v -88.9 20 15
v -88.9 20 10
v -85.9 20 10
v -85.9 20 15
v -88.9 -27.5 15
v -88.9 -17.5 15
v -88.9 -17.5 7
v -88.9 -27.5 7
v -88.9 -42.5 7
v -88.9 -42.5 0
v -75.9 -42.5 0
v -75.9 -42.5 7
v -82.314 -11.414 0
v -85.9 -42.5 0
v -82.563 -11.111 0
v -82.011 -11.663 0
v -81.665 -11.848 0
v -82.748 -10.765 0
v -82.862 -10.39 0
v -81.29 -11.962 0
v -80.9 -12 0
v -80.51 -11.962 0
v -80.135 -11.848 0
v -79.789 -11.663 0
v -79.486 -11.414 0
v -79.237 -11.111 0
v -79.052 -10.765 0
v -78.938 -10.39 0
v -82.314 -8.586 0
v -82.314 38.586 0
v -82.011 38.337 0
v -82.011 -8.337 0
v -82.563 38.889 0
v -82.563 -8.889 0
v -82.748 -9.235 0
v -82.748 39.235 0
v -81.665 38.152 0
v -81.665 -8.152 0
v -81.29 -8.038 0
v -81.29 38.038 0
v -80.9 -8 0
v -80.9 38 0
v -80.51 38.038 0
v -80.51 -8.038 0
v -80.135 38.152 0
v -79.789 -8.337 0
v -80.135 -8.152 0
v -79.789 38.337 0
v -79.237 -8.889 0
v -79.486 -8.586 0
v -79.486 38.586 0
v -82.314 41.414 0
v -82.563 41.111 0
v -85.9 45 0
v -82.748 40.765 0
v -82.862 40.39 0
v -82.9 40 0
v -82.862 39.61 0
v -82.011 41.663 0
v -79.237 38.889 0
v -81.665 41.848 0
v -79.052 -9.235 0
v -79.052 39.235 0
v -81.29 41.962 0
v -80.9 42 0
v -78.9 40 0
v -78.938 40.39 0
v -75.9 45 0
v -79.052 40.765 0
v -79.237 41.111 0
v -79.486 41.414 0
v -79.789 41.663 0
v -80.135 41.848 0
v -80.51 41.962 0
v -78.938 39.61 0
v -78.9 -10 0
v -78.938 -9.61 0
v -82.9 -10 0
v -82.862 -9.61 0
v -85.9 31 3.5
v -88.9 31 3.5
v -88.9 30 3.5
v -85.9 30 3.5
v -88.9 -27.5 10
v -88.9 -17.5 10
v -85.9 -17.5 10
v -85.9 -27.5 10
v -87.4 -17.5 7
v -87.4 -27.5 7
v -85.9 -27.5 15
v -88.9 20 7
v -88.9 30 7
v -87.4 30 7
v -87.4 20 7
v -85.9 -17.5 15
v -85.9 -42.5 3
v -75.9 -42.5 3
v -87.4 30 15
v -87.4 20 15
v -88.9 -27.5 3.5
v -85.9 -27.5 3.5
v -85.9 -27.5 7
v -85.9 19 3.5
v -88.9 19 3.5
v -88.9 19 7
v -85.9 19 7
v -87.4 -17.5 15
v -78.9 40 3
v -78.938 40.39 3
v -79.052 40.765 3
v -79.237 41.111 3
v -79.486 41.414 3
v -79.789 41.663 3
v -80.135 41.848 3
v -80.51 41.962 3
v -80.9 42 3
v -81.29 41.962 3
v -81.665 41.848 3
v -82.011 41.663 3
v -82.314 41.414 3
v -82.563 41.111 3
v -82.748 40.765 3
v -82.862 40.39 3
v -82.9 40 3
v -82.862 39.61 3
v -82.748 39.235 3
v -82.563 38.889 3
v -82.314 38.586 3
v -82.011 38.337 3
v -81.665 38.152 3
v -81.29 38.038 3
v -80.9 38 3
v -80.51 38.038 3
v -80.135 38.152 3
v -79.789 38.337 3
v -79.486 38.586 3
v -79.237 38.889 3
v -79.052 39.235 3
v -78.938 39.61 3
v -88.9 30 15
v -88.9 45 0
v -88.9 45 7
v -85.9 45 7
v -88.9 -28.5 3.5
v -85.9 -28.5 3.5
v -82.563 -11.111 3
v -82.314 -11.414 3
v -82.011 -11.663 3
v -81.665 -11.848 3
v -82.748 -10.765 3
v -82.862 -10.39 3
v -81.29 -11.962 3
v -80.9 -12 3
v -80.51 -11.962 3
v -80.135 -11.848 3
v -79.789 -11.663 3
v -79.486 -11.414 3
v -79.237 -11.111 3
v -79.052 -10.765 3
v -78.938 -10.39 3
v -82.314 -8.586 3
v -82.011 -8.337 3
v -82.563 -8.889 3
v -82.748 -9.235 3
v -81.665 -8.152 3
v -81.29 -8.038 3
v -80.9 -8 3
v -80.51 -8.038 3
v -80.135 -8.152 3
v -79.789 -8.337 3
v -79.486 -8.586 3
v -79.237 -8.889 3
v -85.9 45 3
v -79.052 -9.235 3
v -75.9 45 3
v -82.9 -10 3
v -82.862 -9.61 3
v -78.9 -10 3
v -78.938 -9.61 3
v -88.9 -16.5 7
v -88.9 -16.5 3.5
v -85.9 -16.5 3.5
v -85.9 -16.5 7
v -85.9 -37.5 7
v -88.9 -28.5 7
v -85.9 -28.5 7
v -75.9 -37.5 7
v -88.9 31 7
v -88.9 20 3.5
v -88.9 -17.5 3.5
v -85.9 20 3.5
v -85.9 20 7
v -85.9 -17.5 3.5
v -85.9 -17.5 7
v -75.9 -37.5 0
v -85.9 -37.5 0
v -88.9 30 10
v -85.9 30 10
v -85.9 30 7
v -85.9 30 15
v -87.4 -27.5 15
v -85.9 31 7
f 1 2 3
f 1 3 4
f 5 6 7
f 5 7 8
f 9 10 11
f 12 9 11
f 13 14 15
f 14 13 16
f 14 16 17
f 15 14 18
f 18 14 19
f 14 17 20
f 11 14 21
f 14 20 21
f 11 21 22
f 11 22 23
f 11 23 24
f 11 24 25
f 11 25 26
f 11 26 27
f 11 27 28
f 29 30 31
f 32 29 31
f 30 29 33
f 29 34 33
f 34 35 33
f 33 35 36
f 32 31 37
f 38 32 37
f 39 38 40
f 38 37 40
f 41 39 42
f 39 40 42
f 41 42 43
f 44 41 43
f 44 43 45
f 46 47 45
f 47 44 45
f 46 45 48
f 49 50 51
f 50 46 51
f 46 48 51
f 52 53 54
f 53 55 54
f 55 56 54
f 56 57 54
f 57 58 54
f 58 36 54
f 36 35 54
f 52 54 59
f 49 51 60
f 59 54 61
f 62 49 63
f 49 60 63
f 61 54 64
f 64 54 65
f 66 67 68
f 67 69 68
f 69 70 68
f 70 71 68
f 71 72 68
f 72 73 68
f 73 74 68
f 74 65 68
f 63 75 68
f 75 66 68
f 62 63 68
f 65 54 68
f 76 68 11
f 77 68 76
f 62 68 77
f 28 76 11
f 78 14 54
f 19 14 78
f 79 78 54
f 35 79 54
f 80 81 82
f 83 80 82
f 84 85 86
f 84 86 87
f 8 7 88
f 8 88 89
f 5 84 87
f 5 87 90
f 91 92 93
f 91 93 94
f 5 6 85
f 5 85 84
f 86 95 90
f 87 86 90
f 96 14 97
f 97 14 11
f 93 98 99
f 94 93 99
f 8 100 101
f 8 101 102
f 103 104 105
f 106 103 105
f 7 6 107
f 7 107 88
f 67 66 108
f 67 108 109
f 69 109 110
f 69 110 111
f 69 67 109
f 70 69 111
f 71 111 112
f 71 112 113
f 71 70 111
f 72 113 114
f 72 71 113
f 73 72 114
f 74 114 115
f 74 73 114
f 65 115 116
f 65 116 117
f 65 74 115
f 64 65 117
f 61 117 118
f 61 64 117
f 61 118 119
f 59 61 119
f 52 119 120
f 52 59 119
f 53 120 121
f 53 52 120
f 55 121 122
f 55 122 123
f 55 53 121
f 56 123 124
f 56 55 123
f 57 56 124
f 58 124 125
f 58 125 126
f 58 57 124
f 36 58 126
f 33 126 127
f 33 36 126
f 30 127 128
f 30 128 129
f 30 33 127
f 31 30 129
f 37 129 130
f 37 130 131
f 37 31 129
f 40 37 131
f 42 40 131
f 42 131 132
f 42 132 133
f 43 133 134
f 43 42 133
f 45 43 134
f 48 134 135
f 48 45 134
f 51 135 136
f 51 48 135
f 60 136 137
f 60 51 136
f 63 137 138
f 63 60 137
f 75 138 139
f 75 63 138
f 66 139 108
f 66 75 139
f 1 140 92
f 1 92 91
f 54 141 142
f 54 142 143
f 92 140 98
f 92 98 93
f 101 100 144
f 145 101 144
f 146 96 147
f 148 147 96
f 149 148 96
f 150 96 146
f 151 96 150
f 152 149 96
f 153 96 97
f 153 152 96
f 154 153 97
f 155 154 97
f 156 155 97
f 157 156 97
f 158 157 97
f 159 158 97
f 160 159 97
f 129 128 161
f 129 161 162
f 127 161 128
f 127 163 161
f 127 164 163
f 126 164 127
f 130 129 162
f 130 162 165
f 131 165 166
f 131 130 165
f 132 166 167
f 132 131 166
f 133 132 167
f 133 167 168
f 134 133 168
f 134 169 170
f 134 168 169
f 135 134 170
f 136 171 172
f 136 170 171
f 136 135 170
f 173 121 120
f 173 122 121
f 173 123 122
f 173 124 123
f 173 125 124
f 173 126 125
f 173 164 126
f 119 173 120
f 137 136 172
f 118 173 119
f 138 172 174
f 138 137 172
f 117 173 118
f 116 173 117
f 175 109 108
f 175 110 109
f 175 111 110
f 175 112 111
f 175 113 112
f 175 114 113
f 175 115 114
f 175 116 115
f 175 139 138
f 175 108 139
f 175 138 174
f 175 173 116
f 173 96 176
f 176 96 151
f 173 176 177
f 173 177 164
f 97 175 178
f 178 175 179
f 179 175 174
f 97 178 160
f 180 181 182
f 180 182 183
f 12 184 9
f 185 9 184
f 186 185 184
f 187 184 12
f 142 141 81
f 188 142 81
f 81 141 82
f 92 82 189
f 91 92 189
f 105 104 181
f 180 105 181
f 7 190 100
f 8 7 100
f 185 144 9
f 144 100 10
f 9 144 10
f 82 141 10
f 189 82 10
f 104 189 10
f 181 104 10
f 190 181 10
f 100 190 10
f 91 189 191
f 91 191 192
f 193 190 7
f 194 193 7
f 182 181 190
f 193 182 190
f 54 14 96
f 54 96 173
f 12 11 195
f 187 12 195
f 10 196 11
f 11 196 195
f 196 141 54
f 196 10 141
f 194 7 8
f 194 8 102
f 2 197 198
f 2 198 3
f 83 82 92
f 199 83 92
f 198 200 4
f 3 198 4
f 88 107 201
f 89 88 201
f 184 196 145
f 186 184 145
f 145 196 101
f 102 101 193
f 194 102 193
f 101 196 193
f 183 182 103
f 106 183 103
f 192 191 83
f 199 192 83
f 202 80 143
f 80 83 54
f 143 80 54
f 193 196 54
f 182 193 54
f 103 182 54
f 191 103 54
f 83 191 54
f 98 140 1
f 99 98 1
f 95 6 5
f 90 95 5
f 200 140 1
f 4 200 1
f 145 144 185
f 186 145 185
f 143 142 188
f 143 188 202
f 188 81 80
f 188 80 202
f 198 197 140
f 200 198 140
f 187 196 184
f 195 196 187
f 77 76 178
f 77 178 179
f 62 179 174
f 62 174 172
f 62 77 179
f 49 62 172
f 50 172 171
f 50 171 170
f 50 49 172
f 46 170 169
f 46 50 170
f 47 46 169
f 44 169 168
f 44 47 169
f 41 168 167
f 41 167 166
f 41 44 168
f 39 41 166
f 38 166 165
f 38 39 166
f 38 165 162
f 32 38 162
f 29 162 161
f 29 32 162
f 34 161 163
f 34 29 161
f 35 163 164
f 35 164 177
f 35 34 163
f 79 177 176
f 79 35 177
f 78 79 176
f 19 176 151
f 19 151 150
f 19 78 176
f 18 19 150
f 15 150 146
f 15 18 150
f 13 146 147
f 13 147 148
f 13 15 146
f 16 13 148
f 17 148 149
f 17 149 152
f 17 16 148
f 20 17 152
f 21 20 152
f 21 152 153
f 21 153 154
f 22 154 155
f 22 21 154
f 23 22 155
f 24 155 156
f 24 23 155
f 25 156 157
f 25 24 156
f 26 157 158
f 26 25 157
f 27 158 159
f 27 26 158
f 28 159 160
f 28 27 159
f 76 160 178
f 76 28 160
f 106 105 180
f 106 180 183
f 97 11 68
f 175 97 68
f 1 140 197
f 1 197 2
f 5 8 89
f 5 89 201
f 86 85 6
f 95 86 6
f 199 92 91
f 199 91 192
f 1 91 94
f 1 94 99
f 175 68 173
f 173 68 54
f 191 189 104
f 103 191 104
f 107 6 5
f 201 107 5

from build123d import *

# Parameters (mm, degrees)
F0_W     = 3
F0_H     = 13.5
F0_H_2   = 63
F0_W_2   = 10
F0_H_3   = 5
F1_DEPTH = 7
F0_R     = 2
F2_DEPTH = 3
F3_DEPTH = 3
F5_W     = 1
F5_H     = 3.5
F6_DEPTH = 13.001
F5_W_2   = 10
F5_H_2   = 5
F5_H_3   = 3
F7_DEPTH = 1.5
F8_DEPTH = 3


with BuildPart() as f1:
    # F0 (on Top) → F1 (new body)
    with BuildSketch(Plane.XY):
        with Locations((-87.4, 38.25)):
            Rectangle(F0_W, F0_H)
        with Locations((-87.4, 0)):
            Rectangle(F0_W, F0_H_2)
        Polygon((-88.9, -42.5), (-85.9, -42.5), (-85.9, -37.5), (-85.9, -31.5), (-88.9, -31.5), align=None)
        with Locations((-80.9, -40)):
            Rectangle(F0_W_2, F0_H_3)
    extrude(amount=F1_DEPTH)

    # F5 (on offset) → F6 (cut, through all)
    with BuildSketch(Plane(origin=(-88.9, 0, 0), x_dir=(0, -1, 0), z_dir=(-1, 0, 0))):
        with Locations((-30.5, 5.25)):
            Rectangle(F5_W, F5_H)
        with Locations((-19.5, 5.25)):
            Rectangle(F5_W, F5_H)
        with Locations((17, 5.25)):
            Rectangle(F5_W, F5_H)
        with Locations((28, 5.25)):
            Rectangle(F5_W, F5_H)
    extrude(amount=-F6_DEPTH, mode=Mode.SUBTRACT)


with BuildPart() as f2:
    # F0 (on Top) → F2 (new body)
    with BuildSketch(Plane.XY):
        Polygon((-85.9, -37.5), (-75.9, -37.5), (-75.9, 45), (-85.9, 45), (-85.9, 31.5), (-85.9, -31.5), align=None)
        with Locations((-80.9, -10)):
            Circle(F0_R, mode=Mode.SUBTRACT)
        with Locations((-80.9, 40)):
            Circle(F0_R, mode=Mode.SUBTRACT)
    extrude(amount=F2_DEPTH)

    # F0 (on Top) → F3 (join)
    with BuildSketch(Plane.XY):
        with Locations((-80.9, -40)):
            Rectangle(F0_W_2, F0_H_3)
    extrude(amount=F3_DEPTH)


with BuildPart() as f7:
    # F5 (on offset) → F7 (new body)
    with BuildSketch(Plane(origin=(-88.9, 0, 0), x_dir=(0, -1, 0), z_dir=(-1, 0, 0))):
        with Locations((-25, 12.5)):
            Rectangle(F5_W_2, F5_H_2)
        with Locations((-25, 8.5)):
            Rectangle(F5_W_2, F5_H_3)
    extrude(amount=-F7_DEPTH)


with BuildPart() as f7b:
    # F5 (on offset) → F7, piece 2 (new body)
    with BuildSketch(Plane(origin=(-88.9, 0, 0), x_dir=(0, -1, 0), z_dir=(-1, 0, 0))):
        with Locations((22.5, 12.5)):
            Rectangle(F5_W_2, F5_H_2)
        with Locations((22.5, 8.5)):
            Rectangle(F5_W_2, F5_H_3)
    extrude(amount=-F7_DEPTH)


with BuildPart() as f8:
    # F5 (on offset) → F8 (new body)
    with BuildSketch(Plane(origin=(-88.9, 0, 0), x_dir=(0, -1, 0), z_dir=(-1, 0, 0))):
        with Locations((22.5, 12.5)):
            Rectangle(F5_W_2, F5_H_2)
    extrude(amount=-F8_DEPTH)


with BuildPart() as f8b:
    # F5 (on offset) → F8, piece 2 (new body)
    with BuildSketch(Plane(origin=(-88.9, 0, 0), x_dir=(0, -1, 0), z_dir=(-1, 0, 0))):
        with Locations((-25, 12.5)):
            Rectangle(F5_W_2, F5_H_2)
    extrude(amount=-F8_DEPTH)


solid = Compound([f1.part, f2.part, f7.part, f7b.part, f8.part, f8b.part])
